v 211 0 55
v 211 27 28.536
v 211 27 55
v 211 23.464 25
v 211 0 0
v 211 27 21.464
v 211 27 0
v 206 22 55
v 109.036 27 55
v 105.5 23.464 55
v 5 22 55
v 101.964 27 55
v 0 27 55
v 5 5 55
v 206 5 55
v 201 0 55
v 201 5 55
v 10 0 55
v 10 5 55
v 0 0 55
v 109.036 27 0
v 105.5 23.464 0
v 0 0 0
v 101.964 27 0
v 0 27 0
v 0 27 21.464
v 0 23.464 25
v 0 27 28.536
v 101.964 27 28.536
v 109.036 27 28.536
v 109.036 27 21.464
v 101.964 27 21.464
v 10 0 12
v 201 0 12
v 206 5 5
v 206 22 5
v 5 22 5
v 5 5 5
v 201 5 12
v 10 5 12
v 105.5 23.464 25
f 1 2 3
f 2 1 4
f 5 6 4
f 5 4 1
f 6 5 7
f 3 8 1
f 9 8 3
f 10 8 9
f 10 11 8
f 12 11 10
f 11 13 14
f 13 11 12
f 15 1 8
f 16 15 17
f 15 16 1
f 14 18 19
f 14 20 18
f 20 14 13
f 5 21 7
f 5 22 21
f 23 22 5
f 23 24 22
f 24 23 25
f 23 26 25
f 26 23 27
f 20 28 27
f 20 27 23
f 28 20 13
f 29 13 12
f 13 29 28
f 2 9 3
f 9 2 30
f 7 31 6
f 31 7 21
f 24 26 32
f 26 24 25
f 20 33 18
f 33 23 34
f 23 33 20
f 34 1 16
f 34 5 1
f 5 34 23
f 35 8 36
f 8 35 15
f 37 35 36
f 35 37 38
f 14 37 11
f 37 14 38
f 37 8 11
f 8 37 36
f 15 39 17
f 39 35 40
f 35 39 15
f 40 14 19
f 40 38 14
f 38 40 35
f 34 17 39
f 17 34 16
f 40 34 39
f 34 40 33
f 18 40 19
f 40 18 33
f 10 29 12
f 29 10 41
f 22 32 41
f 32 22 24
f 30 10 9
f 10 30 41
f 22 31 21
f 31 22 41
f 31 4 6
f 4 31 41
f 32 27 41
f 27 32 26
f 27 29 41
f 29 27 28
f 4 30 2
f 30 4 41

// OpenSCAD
thickness = 5;

width = 201;
height = 50;
depth = 17;

block_width = 191;
block_height = 43;
    
difference() {
    // Main body
    cube([width + 2*thickness, depth + 2*thickness, height + thickness]);
    
    // Cut out the jaw
    translate([thickness, thickness, thickness]) 
    cube([width, depth, height]);
    
    // Cut out the block
    translate([thickness + (width - block_width)/2, 0, thickness + height - block_height])
    cube([block_width, depth, block_height]);

    // Cut out the vertical guide
    translate([width/2 + thickness, depth + 2*thickness - sqrt(2*thickness*thickness)/2, 0])
    rotate([0,0,45])
    cube([thickness, thickness, height+thickness]);

    // Cut out the horizontal guide
    translate([0,depth + 2*thickness - sqrt(2*thickness*thickness)/2,height/2])
    rotate([-45,0,0])
    cube([width + 2*thickness, thickness, thickness]);
}
